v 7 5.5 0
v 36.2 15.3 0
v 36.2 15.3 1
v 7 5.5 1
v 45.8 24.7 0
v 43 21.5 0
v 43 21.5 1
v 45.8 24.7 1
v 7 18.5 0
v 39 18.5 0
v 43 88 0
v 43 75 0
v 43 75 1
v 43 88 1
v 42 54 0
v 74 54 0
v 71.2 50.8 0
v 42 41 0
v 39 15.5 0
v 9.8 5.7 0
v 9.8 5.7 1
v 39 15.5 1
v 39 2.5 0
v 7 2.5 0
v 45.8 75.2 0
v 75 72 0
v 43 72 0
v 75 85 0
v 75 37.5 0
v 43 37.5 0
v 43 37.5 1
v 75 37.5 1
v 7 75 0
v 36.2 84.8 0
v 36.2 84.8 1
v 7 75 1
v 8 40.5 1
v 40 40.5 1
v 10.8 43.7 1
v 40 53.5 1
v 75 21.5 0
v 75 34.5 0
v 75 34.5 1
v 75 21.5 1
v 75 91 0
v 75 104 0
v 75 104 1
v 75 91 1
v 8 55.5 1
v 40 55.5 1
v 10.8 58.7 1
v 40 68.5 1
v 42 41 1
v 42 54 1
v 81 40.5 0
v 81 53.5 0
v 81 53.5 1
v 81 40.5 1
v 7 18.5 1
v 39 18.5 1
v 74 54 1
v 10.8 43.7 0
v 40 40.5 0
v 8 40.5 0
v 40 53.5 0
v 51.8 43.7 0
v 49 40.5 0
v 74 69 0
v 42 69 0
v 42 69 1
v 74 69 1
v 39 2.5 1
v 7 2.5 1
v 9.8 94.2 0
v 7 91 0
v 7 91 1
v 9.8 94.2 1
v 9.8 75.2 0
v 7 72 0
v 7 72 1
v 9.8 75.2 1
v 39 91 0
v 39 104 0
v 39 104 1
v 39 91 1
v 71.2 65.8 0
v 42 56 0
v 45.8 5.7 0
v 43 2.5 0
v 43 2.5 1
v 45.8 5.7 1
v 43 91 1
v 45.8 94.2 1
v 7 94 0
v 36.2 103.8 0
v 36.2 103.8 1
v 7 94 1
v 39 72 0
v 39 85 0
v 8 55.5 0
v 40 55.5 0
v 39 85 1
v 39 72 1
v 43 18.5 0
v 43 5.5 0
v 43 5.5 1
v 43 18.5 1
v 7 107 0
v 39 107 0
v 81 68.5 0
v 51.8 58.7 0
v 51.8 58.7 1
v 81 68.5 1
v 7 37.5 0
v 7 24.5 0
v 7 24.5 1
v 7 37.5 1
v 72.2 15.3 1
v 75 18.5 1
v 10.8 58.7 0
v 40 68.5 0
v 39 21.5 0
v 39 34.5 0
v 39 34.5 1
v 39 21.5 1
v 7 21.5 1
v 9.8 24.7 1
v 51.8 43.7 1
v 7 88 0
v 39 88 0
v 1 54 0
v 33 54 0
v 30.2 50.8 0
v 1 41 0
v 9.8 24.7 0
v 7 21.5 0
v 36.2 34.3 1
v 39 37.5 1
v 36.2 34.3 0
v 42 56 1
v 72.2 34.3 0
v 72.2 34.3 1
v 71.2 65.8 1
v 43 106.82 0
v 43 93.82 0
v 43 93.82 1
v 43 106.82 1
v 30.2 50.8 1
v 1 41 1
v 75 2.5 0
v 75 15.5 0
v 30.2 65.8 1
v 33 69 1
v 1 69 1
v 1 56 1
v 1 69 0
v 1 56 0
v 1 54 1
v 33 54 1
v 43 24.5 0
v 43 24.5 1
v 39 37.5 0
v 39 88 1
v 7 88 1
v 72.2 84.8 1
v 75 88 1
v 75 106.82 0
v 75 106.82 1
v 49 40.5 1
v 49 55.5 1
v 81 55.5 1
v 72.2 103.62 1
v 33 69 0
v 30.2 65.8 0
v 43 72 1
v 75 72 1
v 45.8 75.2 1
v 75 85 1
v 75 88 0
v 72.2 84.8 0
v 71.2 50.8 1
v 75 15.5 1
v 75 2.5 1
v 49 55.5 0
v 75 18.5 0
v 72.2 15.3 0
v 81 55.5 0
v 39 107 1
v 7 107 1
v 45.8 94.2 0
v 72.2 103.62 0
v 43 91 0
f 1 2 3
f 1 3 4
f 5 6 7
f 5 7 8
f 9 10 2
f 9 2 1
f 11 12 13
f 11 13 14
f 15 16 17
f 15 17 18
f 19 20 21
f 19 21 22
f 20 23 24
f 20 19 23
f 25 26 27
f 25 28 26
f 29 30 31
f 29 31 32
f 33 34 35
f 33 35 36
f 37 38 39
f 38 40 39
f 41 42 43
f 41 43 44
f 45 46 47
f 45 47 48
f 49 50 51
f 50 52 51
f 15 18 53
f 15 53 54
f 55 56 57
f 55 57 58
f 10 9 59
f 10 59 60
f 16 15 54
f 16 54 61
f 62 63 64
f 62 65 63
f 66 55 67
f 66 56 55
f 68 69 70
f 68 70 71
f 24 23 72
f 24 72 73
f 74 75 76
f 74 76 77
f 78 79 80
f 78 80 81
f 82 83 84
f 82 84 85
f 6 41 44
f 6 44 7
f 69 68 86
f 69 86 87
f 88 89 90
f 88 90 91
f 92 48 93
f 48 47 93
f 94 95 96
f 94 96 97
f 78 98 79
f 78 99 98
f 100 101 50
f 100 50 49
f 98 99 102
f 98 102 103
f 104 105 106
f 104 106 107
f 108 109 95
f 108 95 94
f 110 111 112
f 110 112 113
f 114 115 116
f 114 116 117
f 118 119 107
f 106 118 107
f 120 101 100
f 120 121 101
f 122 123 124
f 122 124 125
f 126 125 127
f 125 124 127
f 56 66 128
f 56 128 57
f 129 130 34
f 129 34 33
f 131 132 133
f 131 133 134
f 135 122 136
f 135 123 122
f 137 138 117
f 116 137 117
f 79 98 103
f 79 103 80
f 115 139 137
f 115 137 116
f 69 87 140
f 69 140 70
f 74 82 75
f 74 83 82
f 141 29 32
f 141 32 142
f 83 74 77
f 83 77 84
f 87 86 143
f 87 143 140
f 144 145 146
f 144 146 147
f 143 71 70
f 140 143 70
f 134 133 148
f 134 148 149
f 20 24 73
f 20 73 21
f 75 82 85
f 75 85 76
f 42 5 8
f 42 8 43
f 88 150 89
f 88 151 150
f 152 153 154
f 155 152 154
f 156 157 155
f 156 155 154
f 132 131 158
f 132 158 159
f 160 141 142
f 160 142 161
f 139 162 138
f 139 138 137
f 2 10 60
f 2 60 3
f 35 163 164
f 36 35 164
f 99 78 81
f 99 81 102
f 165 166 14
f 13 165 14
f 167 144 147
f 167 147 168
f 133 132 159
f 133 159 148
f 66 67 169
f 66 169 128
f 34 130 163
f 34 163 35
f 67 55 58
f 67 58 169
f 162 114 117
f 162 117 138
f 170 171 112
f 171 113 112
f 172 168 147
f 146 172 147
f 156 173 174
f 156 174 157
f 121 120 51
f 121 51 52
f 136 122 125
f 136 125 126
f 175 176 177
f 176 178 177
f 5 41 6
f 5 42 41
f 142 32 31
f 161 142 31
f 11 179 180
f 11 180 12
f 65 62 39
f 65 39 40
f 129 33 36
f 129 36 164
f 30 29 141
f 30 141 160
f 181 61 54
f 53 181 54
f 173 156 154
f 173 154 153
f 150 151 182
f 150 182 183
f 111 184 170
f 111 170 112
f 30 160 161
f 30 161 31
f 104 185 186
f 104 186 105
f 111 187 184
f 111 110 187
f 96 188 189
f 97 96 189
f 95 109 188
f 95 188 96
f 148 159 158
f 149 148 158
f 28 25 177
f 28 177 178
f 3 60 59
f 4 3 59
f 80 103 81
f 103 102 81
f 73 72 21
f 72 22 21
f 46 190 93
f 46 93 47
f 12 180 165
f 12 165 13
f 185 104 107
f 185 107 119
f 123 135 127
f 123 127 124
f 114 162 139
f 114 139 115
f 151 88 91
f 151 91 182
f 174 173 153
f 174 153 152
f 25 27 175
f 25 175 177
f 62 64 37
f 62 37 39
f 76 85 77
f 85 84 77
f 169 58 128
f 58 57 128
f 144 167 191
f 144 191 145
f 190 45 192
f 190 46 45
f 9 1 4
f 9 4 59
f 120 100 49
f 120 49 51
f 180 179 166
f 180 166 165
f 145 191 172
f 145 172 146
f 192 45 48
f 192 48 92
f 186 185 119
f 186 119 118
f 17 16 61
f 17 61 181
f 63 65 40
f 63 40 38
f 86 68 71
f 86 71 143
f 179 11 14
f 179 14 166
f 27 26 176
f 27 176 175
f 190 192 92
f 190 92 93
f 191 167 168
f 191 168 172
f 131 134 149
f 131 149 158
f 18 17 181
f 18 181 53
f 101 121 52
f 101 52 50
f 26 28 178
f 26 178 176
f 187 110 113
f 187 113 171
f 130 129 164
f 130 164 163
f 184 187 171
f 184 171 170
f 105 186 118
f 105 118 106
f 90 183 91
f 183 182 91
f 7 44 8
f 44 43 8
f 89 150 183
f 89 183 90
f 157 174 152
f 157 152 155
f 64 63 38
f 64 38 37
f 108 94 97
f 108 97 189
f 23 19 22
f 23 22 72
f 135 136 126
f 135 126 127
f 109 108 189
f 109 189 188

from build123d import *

# Parameters (mm, degrees)
BOSS_EXTRUDE1_DEPTH    = 1
BOSS_EXTRUDE1_2_DEPTH  = 1
BOSS_EXTRUDE1_3_DEPTH  = 1
BOSS_EXTRUDE1_4_DEPTH  = 1
BOSS_EXTRUDE1_5_DEPTH  = 1
BOSS_EXTRUDE1_6_DEPTH  = 1
BOSS_EXTRUDE1_7_DEPTH  = 1
BOSS_EXTRUDE1_8_DEPTH  = 1
BOSS_EXTRUDE1_9_DEPTH  = 1
BOSS_EXTRUDE1_10_DEPTH = 1
BOSS_EXTRUDE1_11_DEPTH = 1
BOSS_EXTRUDE1_12_DEPTH = 1
BOSS_EXTRUDE1_13_DEPTH = 1
BOSS_EXTRUDE1_14_DEPTH = 1
BOSS_EXTRUDE1_15_DEPTH = 1
BOSS_EXTRUDE1_16_DEPTH = 1
BOSS_EXTRUDE1_17_DEPTH = 1
BOSS_EXTRUDE1_18_DEPTH = 1
BOSS_EXTRUDE1_19_DEPTH = 1
BOSS_EXTRUDE1_20_DEPTH = 1
BOSS_EXTRUDE1_21_DEPTH = 1
BOSS_EXTRUDE1_22_DEPTH = 1
BOSS_EXTRUDE1_23_DEPTH = 1
BOSS_EXTRUDE1_24_DEPTH = 1


with BuildPart() as part:
    # Sketch 21 → Boss-Extrude1 (new body)
    with BuildSketch(Plane.XY):
        Polygon((39, 2.5), (7, 2.5), (9.8, 5.7), (39, 15.5), align=None)
    extrude(amount=BOSS_EXTRUDE1_DEPTH)


with BuildPart() as body_2:
    # Sketch 21 → Boss-Extrude1 2 (new body)
    with BuildSketch(Plane.XY):
        Polygon((7, 18.5), (39, 18.5), (36.2, 15.3), (7, 5.5), align=None)
    extrude(amount=BOSS_EXTRUDE1_2_DEPTH)


with BuildPart() as body_3:
    # Sketch 21 → Boss-Extrude1 3 (new body)
    with BuildSketch(Plane.XY):
        Polygon((43, 18.5), (75, 18.5), (72.2, 15.3), (43, 5.5), align=None)
    extrude(amount=BOSS_EXTRUDE1_3_DEPTH)


with BuildPart() as body_4:
    # Sketch 21 → Boss-Extrude1 4 (new body)
    with BuildSketch(Plane.XY):
        Polygon((75, 2.5), (43, 2.5), (45.8, 5.7), (75, 15.5), align=None)
    extrude(amount=BOSS_EXTRUDE1_4_DEPTH)


with BuildPart() as body_5:
    # Sketch 21 → Boss-Extrude1 5 (new body)
    with BuildSketch(Plane.XY):
        Polygon((39, 21.5), (7, 21.5), (9.8, 24.7), (39, 34.5), align=None)
    extrude(amount=BOSS_EXTRUDE1_5_DEPTH)


with BuildPart() as body_6:
    # Sketch 21 → Boss-Extrude1 6 (new body)
    with BuildSketch(Plane.XY):
        Polygon((7, 37.5), (39, 37.5), (36.2, 34.3), (7, 24.5), align=None)
    extrude(amount=BOSS_EXTRUDE1_6_DEPTH)


with BuildPart() as body_7:
    # Sketch 21 → Boss-Extrude1 7 (new body)
    with BuildSketch(Plane.XY):
        Polygon((43, 37.5), (75, 37.5), (72.2, 34.3), (43, 24.5), align=None)
    extrude(amount=BOSS_EXTRUDE1_7_DEPTH)


with BuildPart() as body_8:
    # Sketch 21 → Boss-Extrude1 8 (new body)
    with BuildSketch(Plane.XY):
        Polygon((75, 21.5), (43, 21.5), (45.8, 24.7), (75, 34.5), align=None)
    extrude(amount=BOSS_EXTRUDE1_8_DEPTH)


with BuildPart() as body_9:
    # Sketch 21 → Boss-Extrude1 9 (new body)
    with BuildSketch(Plane.XY):
        Polygon((40, 40.5), (8, 40.5), (10.8, 43.7), (40, 53.5), align=None)
    extrude(amount=BOSS_EXTRUDE1_9_DEPTH)


with BuildPart() as body_10:
    # Sketch 21 → Boss-Extrude1 10 (new body)
    with BuildSketch(Plane.XY):
        Polygon((1, 54), (33, 54), (30.2, 50.8), (1, 41), align=None)
    extrude(amount=BOSS_EXTRUDE1_10_DEPTH)


with BuildPart() as body_11:
    # Sketch 21 → Boss-Extrude1 11 (new body)
    with BuildSketch(Plane.XY):
        Polygon((42, 54), (74, 54), (71.2, 50.8), (42, 41), align=None)
    extrude(amount=BOSS_EXTRUDE1_11_DEPTH)


with BuildPart() as body_12:
    # Sketch 21 → Boss-Extrude1 12 (new body)
    with BuildSketch(Plane.XY):
        Polygon((81, 40.5), (49, 40.5), (51.8, 43.7), (81, 53.5), align=None)
    extrude(amount=BOSS_EXTRUDE1_12_DEPTH)


with BuildPart() as body_13:
    # Sketch 21 → Boss-Extrude1 13 (new body)
    with BuildSketch(Plane.XY):
        Polygon((40, 55.5), (8, 55.5), (10.8, 58.7), (40, 68.5), align=None)
    extrude(amount=BOSS_EXTRUDE1_13_DEPTH)


with BuildPart() as body_14:
    # Sketch 21 → Boss-Extrude1 14 (new body)
    with BuildSketch(Plane.XY):
        Polygon((1, 69), (33, 69), (30.2, 65.8), (1, 56), align=None)
    extrude(amount=BOSS_EXTRUDE1_14_DEPTH)


with BuildPart() as body_15:
    # Sketch 21 → Boss-Extrude1 15 (new body)
    with BuildSketch(Plane.XY):
        Polygon((42, 69), (74, 69), (71.2, 65.8), (42, 56), align=None)
    extrude(amount=BOSS_EXTRUDE1_15_DEPTH)


with BuildPart() as body_16:
    # Sketch 21 → Boss-Extrude1 16 (new body)
    with BuildSketch(Plane.XY):
        Polygon((81, 55.5), (49, 55.5), (51.8, 58.7), (81, 68.5), align=None)
    extrude(amount=BOSS_EXTRUDE1_16_DEPTH)


with BuildPart() as body_17:
    # Sketch 21 → Boss-Extrude1 17 (new body)
    with BuildSketch(Plane.XY):
        Polygon((39, 72), (7, 72), (9.8, 75.2), (39, 85), align=None)
    extrude(amount=BOSS_EXTRUDE1_17_DEPTH)


with BuildPart() as body_18:
    # Sketch 21 → Boss-Extrude1 18 (new body)
    with BuildSketch(Plane.XY):
        Polygon((7, 88), (39, 88), (36.2, 84.8), (7, 75), align=None)
    extrude(amount=BOSS_EXTRUDE1_18_DEPTH)


with BuildPart() as body_19:
    # Sketch 21 → Boss-Extrude1 19 (new body)
    with BuildSketch(Plane.XY):
        Polygon((43, 88), (75, 88), (72.2, 84.8), (43, 75), align=None)
    extrude(amount=BOSS_EXTRUDE1_19_DEPTH)


with BuildPart() as body_20:
    # Sketch 21 → Boss-Extrude1 20 (new body)
    with BuildSketch(Plane.XY):
        Polygon((75, 72), (43, 72), (45.8, 75.2), (75, 85), align=None)
    extrude(amount=BOSS_EXTRUDE1_20_DEPTH)


with BuildPart() as body_21:
    # Sketch 21 → Boss-Extrude1 21 (new body)
    with BuildSketch(Plane.XY):
        Polygon((39, 91), (7, 91), (9.8, 94.2), (39, 104), align=None)
    extrude(amount=BOSS_EXTRUDE1_21_DEPTH)


with BuildPart() as body_22:
    # Sketch 21 → Boss-Extrude1 22 (new body)
    with BuildSketch(Plane.XY):
        Polygon((7, 107), (39, 107), (36.2, 103.8), (7, 94), align=None)
    extrude(amount=BOSS_EXTRUDE1_22_DEPTH)


with BuildPart() as body_23:
    # Sketch 21 → Boss-Extrude1 23 (new body)
    with BuildSketch(Plane.XY):
        Polygon((43, 106.82), (75, 106.82), (72.2, 103.62), (43, 93.82), align=None)
    extrude(amount=BOSS_EXTRUDE1_23_DEPTH)


with BuildPart() as body_24:
    # Sketch 21 → Boss-Extrude1 24 (new body)
    with BuildSketch(Plane.XY):
        Polygon((75, 91), (43, 91), (45.8, 94.2), (75, 104), align=None)
    extrude(amount=BOSS_EXTRUDE1_24_DEPTH)


solid = Compound([part.part, body_2.part, body_3.part, body_4.part, body_5.part, body_6.part, body_7.part, body_8.part, body_9.part, body_10.part, body_11.part, body_12.part, body_13.part, body_14.part, body_15.part, body_16.part, body_17.part, body_18.part, body_19.part, body_20.part, body_21.part, body_22.part, body_23.part, body_24.part])
